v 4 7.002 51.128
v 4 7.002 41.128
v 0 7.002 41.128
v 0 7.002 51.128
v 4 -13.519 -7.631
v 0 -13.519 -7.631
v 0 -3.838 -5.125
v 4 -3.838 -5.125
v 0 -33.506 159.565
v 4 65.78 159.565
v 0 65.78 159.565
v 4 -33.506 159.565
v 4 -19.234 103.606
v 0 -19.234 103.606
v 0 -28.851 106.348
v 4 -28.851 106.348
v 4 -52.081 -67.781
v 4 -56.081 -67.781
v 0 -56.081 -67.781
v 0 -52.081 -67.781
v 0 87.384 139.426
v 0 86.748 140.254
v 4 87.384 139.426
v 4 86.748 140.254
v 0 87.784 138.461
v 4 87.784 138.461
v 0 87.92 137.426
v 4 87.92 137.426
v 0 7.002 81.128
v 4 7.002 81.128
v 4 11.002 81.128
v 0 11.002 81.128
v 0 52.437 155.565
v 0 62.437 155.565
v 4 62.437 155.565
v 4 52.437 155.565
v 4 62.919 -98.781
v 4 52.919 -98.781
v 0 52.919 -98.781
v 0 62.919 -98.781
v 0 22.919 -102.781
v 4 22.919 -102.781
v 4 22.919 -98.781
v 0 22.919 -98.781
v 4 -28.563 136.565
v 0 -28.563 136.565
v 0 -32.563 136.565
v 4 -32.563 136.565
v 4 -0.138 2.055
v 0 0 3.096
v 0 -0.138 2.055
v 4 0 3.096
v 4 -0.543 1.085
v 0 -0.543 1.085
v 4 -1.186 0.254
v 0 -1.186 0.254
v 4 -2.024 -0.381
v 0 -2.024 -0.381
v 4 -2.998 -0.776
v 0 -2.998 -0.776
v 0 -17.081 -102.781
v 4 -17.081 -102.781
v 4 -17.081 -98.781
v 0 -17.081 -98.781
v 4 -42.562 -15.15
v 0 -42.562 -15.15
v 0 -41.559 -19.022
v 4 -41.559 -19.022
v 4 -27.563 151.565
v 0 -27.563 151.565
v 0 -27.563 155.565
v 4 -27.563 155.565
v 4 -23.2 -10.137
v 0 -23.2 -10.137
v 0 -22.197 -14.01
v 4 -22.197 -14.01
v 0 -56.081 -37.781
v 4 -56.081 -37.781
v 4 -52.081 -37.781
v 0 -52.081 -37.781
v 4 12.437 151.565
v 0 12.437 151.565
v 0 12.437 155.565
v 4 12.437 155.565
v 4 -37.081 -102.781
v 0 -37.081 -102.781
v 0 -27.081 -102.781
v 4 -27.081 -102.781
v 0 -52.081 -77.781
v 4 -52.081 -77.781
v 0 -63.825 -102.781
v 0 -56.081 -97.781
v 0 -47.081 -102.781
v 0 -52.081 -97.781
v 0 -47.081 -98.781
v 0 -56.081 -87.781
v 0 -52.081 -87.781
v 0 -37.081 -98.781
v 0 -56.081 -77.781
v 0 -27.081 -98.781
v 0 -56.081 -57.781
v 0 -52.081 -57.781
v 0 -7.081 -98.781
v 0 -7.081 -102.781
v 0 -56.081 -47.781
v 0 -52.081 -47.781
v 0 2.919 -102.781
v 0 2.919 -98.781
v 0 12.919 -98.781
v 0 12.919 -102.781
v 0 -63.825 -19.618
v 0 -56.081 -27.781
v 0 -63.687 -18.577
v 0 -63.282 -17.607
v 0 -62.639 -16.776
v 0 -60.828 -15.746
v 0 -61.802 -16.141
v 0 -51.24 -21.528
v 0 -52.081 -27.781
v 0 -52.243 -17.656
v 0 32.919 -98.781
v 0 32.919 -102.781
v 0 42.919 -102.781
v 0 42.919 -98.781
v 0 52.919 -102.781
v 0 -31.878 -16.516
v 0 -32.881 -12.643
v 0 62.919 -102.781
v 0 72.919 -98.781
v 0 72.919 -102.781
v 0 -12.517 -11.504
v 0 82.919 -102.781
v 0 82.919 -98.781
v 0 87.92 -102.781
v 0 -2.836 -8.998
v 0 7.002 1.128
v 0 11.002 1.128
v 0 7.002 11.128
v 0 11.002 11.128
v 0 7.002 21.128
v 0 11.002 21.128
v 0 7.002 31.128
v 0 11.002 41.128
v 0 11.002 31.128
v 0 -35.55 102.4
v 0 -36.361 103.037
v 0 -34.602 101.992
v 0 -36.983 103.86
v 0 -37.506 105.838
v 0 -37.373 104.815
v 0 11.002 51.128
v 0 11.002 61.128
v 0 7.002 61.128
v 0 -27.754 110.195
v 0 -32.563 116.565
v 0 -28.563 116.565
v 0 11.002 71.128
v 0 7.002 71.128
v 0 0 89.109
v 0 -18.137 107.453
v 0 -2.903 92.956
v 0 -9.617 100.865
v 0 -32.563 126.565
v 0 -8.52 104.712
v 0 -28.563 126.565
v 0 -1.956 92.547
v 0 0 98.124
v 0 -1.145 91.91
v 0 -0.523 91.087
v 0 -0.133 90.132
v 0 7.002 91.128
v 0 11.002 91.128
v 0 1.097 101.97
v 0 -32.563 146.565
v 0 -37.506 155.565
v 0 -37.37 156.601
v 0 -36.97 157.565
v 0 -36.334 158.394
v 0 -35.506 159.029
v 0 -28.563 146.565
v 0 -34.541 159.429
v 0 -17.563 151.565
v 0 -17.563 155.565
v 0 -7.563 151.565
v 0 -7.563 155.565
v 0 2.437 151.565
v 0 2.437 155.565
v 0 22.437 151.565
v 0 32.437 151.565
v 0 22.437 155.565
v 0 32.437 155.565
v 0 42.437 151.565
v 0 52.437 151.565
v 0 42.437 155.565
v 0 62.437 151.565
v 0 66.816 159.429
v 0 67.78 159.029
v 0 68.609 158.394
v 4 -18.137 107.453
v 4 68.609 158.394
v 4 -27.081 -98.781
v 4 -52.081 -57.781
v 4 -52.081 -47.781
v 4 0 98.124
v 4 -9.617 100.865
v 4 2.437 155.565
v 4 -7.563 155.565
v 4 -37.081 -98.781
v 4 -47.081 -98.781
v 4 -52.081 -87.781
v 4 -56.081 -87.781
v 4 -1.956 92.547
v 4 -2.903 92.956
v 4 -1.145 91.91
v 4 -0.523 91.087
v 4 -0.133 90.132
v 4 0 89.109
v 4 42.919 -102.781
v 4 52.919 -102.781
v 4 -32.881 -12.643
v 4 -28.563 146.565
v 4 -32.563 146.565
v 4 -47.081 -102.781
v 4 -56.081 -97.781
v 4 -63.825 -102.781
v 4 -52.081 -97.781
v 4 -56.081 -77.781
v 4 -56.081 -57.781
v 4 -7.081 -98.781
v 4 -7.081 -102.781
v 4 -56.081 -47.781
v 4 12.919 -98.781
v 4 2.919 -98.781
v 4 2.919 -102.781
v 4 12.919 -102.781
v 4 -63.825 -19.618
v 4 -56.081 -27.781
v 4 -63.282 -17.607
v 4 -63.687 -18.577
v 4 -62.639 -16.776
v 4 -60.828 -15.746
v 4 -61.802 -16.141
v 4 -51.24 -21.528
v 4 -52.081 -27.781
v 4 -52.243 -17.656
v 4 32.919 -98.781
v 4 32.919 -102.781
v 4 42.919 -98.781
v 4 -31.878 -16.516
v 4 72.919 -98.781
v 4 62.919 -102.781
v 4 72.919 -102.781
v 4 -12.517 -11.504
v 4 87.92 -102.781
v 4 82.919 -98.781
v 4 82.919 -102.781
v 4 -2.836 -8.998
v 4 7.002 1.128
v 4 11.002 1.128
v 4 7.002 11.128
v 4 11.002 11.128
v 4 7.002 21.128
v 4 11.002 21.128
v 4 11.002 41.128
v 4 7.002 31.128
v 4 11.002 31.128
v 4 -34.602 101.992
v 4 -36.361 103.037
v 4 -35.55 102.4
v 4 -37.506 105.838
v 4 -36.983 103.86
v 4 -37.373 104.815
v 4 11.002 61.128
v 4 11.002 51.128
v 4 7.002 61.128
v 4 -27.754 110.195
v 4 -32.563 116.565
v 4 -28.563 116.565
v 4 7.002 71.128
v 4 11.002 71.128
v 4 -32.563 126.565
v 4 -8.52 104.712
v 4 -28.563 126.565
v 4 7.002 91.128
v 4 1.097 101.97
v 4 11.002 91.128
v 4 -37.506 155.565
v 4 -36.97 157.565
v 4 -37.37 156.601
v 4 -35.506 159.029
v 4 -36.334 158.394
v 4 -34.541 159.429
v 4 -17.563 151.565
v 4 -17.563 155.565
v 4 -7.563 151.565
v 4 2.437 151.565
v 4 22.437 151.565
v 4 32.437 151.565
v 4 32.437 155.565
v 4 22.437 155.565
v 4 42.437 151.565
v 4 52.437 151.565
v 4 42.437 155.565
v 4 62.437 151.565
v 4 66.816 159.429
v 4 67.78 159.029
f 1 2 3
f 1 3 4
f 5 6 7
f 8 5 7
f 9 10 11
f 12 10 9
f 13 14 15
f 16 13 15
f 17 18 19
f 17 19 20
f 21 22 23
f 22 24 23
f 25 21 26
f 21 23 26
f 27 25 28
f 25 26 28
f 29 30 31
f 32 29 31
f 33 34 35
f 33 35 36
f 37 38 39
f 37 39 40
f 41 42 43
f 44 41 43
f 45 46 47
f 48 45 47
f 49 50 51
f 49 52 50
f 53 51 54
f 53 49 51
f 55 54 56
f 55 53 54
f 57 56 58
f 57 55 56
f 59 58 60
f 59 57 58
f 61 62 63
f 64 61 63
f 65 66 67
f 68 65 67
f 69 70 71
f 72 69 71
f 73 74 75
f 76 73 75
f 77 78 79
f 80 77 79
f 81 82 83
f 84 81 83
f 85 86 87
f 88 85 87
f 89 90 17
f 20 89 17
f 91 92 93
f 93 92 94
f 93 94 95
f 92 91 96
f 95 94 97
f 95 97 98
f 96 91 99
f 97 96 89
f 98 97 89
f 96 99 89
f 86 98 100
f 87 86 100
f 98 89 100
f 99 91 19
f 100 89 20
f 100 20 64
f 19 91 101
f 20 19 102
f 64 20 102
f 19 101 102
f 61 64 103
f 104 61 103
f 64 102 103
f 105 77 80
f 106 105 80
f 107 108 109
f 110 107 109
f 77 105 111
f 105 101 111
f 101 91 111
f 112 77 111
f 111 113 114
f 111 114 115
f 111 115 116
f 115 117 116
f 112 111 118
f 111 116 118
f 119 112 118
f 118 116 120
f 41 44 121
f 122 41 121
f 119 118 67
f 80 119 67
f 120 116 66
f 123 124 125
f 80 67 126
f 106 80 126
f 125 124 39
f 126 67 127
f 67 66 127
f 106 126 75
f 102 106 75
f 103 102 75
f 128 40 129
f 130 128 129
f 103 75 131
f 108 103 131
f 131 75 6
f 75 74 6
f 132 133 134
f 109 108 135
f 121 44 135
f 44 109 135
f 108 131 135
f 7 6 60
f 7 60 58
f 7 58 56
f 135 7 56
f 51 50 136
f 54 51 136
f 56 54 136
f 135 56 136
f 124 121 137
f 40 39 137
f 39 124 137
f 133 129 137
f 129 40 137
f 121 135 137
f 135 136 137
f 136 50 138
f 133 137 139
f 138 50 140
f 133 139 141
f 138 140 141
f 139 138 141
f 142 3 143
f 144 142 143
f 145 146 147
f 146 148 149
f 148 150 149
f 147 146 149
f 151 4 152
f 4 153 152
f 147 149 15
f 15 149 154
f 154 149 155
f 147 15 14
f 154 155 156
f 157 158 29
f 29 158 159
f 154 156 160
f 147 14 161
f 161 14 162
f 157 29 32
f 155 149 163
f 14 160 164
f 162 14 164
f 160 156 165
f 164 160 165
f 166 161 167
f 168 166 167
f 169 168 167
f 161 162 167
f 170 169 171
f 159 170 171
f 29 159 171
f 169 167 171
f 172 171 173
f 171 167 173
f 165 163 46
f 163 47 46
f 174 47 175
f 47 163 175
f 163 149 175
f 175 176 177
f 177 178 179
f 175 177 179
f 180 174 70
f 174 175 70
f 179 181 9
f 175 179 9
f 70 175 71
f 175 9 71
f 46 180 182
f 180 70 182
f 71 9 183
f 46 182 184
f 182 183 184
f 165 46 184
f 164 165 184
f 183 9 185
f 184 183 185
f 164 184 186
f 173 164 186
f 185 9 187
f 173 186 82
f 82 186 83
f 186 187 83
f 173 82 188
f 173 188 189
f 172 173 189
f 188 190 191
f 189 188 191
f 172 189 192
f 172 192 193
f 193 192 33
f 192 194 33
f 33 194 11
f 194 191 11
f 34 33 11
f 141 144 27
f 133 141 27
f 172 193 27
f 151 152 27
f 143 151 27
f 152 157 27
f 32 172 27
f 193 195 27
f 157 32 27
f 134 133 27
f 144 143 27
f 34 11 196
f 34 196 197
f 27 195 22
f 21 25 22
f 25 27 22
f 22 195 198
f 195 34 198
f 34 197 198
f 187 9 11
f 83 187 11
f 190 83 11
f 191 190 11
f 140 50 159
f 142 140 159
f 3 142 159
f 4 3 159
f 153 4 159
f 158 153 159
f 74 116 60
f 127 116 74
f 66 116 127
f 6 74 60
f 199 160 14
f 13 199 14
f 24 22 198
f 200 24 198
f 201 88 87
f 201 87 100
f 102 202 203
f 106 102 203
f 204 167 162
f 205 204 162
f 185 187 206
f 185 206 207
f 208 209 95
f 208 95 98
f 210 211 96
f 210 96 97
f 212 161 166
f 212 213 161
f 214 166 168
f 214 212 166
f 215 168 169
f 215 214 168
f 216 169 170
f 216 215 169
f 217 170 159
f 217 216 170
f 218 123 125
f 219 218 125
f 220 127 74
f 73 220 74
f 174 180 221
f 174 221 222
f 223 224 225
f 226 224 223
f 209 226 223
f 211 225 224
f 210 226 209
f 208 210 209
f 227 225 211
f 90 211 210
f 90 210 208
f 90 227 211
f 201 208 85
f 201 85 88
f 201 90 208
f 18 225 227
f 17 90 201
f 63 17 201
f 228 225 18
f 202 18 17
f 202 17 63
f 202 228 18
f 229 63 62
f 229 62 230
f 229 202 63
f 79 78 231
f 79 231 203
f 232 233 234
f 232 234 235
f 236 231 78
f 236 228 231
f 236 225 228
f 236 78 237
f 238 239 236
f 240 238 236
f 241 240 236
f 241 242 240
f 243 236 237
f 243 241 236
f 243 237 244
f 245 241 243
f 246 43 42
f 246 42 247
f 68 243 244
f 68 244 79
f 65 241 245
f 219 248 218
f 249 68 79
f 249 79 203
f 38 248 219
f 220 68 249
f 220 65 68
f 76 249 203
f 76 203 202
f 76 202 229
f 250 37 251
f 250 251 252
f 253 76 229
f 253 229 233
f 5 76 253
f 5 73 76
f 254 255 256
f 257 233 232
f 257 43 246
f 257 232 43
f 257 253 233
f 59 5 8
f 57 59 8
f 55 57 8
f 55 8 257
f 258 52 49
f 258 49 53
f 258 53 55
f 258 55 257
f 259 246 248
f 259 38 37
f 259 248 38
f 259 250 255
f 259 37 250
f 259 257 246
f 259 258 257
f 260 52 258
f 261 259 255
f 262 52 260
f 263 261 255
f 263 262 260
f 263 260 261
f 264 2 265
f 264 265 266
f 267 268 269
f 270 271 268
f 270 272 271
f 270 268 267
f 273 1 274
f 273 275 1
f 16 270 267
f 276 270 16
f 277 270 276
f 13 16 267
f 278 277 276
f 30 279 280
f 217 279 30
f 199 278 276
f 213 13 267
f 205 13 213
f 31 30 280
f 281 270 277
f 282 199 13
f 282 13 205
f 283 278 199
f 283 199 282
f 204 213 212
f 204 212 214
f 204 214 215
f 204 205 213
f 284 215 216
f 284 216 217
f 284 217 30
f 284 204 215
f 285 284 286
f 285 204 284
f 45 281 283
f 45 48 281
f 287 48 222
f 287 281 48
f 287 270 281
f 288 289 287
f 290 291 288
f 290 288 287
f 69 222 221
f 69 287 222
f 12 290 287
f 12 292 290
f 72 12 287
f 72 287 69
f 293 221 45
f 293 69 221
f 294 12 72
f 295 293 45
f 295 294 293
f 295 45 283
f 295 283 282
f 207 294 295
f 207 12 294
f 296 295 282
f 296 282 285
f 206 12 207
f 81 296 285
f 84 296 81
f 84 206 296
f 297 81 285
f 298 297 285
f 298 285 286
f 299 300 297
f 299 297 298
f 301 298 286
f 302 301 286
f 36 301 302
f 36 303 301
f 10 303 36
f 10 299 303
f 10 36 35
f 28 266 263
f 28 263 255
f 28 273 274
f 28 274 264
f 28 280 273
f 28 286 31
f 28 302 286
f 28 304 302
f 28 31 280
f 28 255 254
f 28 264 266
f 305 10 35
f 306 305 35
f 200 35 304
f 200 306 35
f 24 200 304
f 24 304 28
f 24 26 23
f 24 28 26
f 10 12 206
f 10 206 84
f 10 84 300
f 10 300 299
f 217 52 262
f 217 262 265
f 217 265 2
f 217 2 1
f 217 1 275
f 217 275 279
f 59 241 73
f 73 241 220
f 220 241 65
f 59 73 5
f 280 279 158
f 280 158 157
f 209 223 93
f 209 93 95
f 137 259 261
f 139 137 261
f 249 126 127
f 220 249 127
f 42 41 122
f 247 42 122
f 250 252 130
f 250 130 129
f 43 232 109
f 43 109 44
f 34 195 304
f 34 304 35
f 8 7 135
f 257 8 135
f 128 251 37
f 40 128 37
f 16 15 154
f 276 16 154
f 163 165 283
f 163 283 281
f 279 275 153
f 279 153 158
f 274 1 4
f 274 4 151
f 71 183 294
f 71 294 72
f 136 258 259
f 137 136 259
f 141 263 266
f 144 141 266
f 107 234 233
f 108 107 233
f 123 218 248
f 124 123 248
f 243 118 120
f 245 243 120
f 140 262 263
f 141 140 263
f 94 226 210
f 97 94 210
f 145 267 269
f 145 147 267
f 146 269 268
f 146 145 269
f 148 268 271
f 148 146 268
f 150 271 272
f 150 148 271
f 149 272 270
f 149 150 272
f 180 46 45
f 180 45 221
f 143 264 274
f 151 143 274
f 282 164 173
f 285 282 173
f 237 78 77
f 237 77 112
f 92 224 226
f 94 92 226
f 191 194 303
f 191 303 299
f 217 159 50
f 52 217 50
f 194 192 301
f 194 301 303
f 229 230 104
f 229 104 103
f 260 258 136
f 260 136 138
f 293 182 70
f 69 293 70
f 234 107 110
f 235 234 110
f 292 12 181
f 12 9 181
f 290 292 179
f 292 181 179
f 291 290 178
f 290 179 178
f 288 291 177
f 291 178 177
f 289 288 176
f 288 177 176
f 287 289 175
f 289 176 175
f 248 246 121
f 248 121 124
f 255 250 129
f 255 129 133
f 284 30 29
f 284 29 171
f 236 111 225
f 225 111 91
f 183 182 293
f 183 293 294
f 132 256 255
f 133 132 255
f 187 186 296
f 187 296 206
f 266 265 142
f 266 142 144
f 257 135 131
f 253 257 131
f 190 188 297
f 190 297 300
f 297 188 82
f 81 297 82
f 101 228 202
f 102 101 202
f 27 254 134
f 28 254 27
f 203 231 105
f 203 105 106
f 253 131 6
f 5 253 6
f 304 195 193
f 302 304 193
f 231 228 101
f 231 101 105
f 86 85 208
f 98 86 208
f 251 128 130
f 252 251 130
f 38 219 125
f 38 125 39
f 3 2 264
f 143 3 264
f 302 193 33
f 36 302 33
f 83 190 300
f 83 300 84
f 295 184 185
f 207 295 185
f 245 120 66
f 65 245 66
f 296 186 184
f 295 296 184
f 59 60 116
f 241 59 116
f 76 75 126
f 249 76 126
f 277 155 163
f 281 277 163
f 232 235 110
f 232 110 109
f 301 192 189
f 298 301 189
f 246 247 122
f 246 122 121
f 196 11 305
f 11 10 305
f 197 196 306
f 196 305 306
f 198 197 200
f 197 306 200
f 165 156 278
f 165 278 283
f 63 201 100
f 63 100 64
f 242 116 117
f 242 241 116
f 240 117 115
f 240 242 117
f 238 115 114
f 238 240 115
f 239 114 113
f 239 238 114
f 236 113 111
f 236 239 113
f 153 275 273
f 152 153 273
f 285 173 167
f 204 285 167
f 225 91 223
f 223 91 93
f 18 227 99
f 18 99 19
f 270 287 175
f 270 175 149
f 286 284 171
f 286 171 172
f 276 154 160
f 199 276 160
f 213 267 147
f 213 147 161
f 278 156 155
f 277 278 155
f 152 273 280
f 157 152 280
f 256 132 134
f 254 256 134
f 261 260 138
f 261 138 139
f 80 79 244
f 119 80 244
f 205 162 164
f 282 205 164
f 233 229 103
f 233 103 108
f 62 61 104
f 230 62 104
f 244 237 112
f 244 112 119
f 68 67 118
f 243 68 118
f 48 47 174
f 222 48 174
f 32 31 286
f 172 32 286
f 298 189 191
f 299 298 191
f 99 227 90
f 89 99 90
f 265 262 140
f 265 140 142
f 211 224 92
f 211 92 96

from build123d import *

# Parameters (mm, degrees)
F1_DEPTH  = 4
F2_R      = 4
F3_W      = 4
F3_H      = 10
F4_DEPTH  = 4
F5_W      = 4
F5_H      = 10
F5_W_2    = 10
F5_H_2    = 4
F6_DEPTH  = 4
F8_DEPTH  = 4
F9_R      = 4
F10_W     = 10
F10_H     = 4
F10_W_2   = 4
F10_H_2   = 10
F11_DEPTH = 25
F12_R     = 4


with BuildPart() as f1:
    # F0 (on Right) → F1 (new body)
    with BuildSketch(Plane.YZ):
        Polygon((0, 92.128), (0, 0), (-63.825185854, -16.522066811), (-63.825185854, -102.781066811), (87.919814146, -102.781066811), (87.919814146, 92.128), align=None)
        Polygon((-52.2425177801, -17.65557521), (-42.5616207767, -15.149535863), (-41.5592050378, -19.0218946644), (-51.2401020413, -21.5279340114), align=None, mode=Mode.SUBTRACT)
        Polygon((-32.8807237732, -12.643496516), (-23.1998267698, -10.1374571689), (-22.197411031, -14.0098159703), (-31.8783080344, -16.5158553174), align=None, mode=Mode.SUBTRACT)
        Polygon((-13.5189297663, -7.6314178219), (-3.8380327629, -5.1253784749), (-2.8356170241, -8.9977372763), (-12.5165140275, -11.5037766233), align=None, mode=Mode.SUBTRACT)
    extrude(amount=F1_DEPTH)

    # F2
    f2_edges = [f1.edges().sort_by_distance(p)[0] for p in [
        (2, -63.825186, -16.522067),
    ]]
    fillet(f2_edges, radius=F2_R)

    # F3 (on face) → F4 (cut)
    with BuildSketch(Plane.YZ.offset(4)):
        with Locations((9.0024157388, 86.1276411986)):
            Rectangle(F3_W, F3_H)
        with Locations((9.0024157388, 66.1276411986)):
            Rectangle(F3_W, F3_H)
        with Locations((9.0024157388, 46.1276411986)):
            Rectangle(F3_W, F3_H)
        with Locations((9.0024157388, 26.1276411986)):
            Rectangle(F3_W, F3_H)
        with Locations((9.0024157388, 6.1276411986)):
            Rectangle(F3_W, F3_H)
    extrude(amount=-F4_DEPTH, mode=Mode.SUBTRACT)

    # F5 (on face) → F6 (cut)
    with BuildSketch(Plane.YZ.offset(4)):
        with Locations((-54.080550543, -32.7809536849)):
            Rectangle(F5_W, F5_H)
        with Locations((-54.080550543, -52.7809536849)):
            Rectangle(F5_W, F5_H)
        with Locations((-54.080550543, -72.7809536849)):
            Rectangle(F5_W, F5_H)
        with Locations((-54.080550543, -92.7809536849)):
            Rectangle(F5_W, F5_H)
        with Locations((-2.080550543, -100.781066811)):
            Rectangle(F5_W_2, F5_H_2)
        with Locations((17.919449457, -100.781066811)):
            Rectangle(F5_W_2, F5_H_2)
        with Locations((37.919449457, -100.781066811)):
            Rectangle(F5_W_2, F5_H_2)
        with Locations((-22.080550543, -100.781066811)):
            Rectangle(F5_W_2, F5_H_2)
        with Locations((-42.080550543, -100.781066811)):
            Rectangle(F5_W_2, F5_H_2)
        with Locations((57.919449457, -100.781066811)):
            Rectangle(F5_W_2, F5_H_2)
        with Locations((77.919449457, -100.781066811)):
            Rectangle(F5_W_2, F5_H_2)
    extrude(amount=-F6_DEPTH, mode=Mode.SUBTRACT)

    # F7 (on face) → F8 (join)
    with BuildSketch(Plane.YZ.offset(4)):
        Polygon((-37.5059572495, 102.8192660989), (0, 92.128), (87.919814146, 92.128), (87.919814146, 159.5652660989), (-37.5059572495, 159.5652660989), align=None)
    extrude(amount=-F8_DEPTH)

    # F9
    f9_edges = [f1.edges().sort_by_distance(p)[0] for p in [
        (2, -37.505957, 159.565266),
        (2, 87.919814, 159.565266),
        (2, -37.505957, 102.819266),
    ]]
    fillet(f9_edges, radius=F9_R)

    # F10 (on face) → F11 (cut)
    with BuildSketch(Plane(origin=(0, 0, 0), x_dir=(0, -1, 0), z_dir=(-1, 0, 0))):
        Polygon((-1.0965401127, 101.9704806816), (0, 98.1237158355), (9.6169121153, 100.8650661173), (8.5203720026, 104.7118309634), align=None)
        with Locations((22.5626522907, 153.5652066678)):
            Rectangle(F10_W, F10_H)
        with Locations((30.5626522907, 141.5652066678)):
            Rectangle(F10_W_2, F10_H_2)
        with Locations((30.5626522907, 121.5652066678)):
            Rectangle(F10_W_2, F10_H_2)
        Polygon((18.1372841178, 107.4531812452), (19.2338242305, 103.6064163991), (28.8507363458, 106.3477666808), (27.7541962331, 110.1945315269), align=None)
        with Locations((2.5626522907, 153.5652066678)):
            Rectangle(F10_W, F10_H)
        with Locations((-17.4373477093, 153.5652066678)):
            Rectangle(F10_W, F10_H)
        with Locations((-37.4373477093, 153.5652066678)):
            Rectangle(F10_W, F10_H)
        Polygon((-80.7050293604, 146.2975250167), (-71.4373477093, 155.5652066678), (-67.4372882782, 159.5652660989), (-87.919814146, 159.5652660989), (-87.919814146, 139.0827402311), align=None)
        with Locations((-57.4373477093, 153.5652066678)):
            Rectangle(F10_W, F10_H)
    extrude(amount=-F11_DEPTH, mode=Mode.SUBTRACT)

    # F12
    f12_edges = [f1.edges().sort_by_distance(p)[0] for p in [
        (2, 67.437288, 159.565266),
        (2, 87.919814, 139.08274),
        (2, 0, 92.128),
        (2, 0, 0),
    ]]
    fillet(f12_edges, radius=F12_R)


solid = f1.part
